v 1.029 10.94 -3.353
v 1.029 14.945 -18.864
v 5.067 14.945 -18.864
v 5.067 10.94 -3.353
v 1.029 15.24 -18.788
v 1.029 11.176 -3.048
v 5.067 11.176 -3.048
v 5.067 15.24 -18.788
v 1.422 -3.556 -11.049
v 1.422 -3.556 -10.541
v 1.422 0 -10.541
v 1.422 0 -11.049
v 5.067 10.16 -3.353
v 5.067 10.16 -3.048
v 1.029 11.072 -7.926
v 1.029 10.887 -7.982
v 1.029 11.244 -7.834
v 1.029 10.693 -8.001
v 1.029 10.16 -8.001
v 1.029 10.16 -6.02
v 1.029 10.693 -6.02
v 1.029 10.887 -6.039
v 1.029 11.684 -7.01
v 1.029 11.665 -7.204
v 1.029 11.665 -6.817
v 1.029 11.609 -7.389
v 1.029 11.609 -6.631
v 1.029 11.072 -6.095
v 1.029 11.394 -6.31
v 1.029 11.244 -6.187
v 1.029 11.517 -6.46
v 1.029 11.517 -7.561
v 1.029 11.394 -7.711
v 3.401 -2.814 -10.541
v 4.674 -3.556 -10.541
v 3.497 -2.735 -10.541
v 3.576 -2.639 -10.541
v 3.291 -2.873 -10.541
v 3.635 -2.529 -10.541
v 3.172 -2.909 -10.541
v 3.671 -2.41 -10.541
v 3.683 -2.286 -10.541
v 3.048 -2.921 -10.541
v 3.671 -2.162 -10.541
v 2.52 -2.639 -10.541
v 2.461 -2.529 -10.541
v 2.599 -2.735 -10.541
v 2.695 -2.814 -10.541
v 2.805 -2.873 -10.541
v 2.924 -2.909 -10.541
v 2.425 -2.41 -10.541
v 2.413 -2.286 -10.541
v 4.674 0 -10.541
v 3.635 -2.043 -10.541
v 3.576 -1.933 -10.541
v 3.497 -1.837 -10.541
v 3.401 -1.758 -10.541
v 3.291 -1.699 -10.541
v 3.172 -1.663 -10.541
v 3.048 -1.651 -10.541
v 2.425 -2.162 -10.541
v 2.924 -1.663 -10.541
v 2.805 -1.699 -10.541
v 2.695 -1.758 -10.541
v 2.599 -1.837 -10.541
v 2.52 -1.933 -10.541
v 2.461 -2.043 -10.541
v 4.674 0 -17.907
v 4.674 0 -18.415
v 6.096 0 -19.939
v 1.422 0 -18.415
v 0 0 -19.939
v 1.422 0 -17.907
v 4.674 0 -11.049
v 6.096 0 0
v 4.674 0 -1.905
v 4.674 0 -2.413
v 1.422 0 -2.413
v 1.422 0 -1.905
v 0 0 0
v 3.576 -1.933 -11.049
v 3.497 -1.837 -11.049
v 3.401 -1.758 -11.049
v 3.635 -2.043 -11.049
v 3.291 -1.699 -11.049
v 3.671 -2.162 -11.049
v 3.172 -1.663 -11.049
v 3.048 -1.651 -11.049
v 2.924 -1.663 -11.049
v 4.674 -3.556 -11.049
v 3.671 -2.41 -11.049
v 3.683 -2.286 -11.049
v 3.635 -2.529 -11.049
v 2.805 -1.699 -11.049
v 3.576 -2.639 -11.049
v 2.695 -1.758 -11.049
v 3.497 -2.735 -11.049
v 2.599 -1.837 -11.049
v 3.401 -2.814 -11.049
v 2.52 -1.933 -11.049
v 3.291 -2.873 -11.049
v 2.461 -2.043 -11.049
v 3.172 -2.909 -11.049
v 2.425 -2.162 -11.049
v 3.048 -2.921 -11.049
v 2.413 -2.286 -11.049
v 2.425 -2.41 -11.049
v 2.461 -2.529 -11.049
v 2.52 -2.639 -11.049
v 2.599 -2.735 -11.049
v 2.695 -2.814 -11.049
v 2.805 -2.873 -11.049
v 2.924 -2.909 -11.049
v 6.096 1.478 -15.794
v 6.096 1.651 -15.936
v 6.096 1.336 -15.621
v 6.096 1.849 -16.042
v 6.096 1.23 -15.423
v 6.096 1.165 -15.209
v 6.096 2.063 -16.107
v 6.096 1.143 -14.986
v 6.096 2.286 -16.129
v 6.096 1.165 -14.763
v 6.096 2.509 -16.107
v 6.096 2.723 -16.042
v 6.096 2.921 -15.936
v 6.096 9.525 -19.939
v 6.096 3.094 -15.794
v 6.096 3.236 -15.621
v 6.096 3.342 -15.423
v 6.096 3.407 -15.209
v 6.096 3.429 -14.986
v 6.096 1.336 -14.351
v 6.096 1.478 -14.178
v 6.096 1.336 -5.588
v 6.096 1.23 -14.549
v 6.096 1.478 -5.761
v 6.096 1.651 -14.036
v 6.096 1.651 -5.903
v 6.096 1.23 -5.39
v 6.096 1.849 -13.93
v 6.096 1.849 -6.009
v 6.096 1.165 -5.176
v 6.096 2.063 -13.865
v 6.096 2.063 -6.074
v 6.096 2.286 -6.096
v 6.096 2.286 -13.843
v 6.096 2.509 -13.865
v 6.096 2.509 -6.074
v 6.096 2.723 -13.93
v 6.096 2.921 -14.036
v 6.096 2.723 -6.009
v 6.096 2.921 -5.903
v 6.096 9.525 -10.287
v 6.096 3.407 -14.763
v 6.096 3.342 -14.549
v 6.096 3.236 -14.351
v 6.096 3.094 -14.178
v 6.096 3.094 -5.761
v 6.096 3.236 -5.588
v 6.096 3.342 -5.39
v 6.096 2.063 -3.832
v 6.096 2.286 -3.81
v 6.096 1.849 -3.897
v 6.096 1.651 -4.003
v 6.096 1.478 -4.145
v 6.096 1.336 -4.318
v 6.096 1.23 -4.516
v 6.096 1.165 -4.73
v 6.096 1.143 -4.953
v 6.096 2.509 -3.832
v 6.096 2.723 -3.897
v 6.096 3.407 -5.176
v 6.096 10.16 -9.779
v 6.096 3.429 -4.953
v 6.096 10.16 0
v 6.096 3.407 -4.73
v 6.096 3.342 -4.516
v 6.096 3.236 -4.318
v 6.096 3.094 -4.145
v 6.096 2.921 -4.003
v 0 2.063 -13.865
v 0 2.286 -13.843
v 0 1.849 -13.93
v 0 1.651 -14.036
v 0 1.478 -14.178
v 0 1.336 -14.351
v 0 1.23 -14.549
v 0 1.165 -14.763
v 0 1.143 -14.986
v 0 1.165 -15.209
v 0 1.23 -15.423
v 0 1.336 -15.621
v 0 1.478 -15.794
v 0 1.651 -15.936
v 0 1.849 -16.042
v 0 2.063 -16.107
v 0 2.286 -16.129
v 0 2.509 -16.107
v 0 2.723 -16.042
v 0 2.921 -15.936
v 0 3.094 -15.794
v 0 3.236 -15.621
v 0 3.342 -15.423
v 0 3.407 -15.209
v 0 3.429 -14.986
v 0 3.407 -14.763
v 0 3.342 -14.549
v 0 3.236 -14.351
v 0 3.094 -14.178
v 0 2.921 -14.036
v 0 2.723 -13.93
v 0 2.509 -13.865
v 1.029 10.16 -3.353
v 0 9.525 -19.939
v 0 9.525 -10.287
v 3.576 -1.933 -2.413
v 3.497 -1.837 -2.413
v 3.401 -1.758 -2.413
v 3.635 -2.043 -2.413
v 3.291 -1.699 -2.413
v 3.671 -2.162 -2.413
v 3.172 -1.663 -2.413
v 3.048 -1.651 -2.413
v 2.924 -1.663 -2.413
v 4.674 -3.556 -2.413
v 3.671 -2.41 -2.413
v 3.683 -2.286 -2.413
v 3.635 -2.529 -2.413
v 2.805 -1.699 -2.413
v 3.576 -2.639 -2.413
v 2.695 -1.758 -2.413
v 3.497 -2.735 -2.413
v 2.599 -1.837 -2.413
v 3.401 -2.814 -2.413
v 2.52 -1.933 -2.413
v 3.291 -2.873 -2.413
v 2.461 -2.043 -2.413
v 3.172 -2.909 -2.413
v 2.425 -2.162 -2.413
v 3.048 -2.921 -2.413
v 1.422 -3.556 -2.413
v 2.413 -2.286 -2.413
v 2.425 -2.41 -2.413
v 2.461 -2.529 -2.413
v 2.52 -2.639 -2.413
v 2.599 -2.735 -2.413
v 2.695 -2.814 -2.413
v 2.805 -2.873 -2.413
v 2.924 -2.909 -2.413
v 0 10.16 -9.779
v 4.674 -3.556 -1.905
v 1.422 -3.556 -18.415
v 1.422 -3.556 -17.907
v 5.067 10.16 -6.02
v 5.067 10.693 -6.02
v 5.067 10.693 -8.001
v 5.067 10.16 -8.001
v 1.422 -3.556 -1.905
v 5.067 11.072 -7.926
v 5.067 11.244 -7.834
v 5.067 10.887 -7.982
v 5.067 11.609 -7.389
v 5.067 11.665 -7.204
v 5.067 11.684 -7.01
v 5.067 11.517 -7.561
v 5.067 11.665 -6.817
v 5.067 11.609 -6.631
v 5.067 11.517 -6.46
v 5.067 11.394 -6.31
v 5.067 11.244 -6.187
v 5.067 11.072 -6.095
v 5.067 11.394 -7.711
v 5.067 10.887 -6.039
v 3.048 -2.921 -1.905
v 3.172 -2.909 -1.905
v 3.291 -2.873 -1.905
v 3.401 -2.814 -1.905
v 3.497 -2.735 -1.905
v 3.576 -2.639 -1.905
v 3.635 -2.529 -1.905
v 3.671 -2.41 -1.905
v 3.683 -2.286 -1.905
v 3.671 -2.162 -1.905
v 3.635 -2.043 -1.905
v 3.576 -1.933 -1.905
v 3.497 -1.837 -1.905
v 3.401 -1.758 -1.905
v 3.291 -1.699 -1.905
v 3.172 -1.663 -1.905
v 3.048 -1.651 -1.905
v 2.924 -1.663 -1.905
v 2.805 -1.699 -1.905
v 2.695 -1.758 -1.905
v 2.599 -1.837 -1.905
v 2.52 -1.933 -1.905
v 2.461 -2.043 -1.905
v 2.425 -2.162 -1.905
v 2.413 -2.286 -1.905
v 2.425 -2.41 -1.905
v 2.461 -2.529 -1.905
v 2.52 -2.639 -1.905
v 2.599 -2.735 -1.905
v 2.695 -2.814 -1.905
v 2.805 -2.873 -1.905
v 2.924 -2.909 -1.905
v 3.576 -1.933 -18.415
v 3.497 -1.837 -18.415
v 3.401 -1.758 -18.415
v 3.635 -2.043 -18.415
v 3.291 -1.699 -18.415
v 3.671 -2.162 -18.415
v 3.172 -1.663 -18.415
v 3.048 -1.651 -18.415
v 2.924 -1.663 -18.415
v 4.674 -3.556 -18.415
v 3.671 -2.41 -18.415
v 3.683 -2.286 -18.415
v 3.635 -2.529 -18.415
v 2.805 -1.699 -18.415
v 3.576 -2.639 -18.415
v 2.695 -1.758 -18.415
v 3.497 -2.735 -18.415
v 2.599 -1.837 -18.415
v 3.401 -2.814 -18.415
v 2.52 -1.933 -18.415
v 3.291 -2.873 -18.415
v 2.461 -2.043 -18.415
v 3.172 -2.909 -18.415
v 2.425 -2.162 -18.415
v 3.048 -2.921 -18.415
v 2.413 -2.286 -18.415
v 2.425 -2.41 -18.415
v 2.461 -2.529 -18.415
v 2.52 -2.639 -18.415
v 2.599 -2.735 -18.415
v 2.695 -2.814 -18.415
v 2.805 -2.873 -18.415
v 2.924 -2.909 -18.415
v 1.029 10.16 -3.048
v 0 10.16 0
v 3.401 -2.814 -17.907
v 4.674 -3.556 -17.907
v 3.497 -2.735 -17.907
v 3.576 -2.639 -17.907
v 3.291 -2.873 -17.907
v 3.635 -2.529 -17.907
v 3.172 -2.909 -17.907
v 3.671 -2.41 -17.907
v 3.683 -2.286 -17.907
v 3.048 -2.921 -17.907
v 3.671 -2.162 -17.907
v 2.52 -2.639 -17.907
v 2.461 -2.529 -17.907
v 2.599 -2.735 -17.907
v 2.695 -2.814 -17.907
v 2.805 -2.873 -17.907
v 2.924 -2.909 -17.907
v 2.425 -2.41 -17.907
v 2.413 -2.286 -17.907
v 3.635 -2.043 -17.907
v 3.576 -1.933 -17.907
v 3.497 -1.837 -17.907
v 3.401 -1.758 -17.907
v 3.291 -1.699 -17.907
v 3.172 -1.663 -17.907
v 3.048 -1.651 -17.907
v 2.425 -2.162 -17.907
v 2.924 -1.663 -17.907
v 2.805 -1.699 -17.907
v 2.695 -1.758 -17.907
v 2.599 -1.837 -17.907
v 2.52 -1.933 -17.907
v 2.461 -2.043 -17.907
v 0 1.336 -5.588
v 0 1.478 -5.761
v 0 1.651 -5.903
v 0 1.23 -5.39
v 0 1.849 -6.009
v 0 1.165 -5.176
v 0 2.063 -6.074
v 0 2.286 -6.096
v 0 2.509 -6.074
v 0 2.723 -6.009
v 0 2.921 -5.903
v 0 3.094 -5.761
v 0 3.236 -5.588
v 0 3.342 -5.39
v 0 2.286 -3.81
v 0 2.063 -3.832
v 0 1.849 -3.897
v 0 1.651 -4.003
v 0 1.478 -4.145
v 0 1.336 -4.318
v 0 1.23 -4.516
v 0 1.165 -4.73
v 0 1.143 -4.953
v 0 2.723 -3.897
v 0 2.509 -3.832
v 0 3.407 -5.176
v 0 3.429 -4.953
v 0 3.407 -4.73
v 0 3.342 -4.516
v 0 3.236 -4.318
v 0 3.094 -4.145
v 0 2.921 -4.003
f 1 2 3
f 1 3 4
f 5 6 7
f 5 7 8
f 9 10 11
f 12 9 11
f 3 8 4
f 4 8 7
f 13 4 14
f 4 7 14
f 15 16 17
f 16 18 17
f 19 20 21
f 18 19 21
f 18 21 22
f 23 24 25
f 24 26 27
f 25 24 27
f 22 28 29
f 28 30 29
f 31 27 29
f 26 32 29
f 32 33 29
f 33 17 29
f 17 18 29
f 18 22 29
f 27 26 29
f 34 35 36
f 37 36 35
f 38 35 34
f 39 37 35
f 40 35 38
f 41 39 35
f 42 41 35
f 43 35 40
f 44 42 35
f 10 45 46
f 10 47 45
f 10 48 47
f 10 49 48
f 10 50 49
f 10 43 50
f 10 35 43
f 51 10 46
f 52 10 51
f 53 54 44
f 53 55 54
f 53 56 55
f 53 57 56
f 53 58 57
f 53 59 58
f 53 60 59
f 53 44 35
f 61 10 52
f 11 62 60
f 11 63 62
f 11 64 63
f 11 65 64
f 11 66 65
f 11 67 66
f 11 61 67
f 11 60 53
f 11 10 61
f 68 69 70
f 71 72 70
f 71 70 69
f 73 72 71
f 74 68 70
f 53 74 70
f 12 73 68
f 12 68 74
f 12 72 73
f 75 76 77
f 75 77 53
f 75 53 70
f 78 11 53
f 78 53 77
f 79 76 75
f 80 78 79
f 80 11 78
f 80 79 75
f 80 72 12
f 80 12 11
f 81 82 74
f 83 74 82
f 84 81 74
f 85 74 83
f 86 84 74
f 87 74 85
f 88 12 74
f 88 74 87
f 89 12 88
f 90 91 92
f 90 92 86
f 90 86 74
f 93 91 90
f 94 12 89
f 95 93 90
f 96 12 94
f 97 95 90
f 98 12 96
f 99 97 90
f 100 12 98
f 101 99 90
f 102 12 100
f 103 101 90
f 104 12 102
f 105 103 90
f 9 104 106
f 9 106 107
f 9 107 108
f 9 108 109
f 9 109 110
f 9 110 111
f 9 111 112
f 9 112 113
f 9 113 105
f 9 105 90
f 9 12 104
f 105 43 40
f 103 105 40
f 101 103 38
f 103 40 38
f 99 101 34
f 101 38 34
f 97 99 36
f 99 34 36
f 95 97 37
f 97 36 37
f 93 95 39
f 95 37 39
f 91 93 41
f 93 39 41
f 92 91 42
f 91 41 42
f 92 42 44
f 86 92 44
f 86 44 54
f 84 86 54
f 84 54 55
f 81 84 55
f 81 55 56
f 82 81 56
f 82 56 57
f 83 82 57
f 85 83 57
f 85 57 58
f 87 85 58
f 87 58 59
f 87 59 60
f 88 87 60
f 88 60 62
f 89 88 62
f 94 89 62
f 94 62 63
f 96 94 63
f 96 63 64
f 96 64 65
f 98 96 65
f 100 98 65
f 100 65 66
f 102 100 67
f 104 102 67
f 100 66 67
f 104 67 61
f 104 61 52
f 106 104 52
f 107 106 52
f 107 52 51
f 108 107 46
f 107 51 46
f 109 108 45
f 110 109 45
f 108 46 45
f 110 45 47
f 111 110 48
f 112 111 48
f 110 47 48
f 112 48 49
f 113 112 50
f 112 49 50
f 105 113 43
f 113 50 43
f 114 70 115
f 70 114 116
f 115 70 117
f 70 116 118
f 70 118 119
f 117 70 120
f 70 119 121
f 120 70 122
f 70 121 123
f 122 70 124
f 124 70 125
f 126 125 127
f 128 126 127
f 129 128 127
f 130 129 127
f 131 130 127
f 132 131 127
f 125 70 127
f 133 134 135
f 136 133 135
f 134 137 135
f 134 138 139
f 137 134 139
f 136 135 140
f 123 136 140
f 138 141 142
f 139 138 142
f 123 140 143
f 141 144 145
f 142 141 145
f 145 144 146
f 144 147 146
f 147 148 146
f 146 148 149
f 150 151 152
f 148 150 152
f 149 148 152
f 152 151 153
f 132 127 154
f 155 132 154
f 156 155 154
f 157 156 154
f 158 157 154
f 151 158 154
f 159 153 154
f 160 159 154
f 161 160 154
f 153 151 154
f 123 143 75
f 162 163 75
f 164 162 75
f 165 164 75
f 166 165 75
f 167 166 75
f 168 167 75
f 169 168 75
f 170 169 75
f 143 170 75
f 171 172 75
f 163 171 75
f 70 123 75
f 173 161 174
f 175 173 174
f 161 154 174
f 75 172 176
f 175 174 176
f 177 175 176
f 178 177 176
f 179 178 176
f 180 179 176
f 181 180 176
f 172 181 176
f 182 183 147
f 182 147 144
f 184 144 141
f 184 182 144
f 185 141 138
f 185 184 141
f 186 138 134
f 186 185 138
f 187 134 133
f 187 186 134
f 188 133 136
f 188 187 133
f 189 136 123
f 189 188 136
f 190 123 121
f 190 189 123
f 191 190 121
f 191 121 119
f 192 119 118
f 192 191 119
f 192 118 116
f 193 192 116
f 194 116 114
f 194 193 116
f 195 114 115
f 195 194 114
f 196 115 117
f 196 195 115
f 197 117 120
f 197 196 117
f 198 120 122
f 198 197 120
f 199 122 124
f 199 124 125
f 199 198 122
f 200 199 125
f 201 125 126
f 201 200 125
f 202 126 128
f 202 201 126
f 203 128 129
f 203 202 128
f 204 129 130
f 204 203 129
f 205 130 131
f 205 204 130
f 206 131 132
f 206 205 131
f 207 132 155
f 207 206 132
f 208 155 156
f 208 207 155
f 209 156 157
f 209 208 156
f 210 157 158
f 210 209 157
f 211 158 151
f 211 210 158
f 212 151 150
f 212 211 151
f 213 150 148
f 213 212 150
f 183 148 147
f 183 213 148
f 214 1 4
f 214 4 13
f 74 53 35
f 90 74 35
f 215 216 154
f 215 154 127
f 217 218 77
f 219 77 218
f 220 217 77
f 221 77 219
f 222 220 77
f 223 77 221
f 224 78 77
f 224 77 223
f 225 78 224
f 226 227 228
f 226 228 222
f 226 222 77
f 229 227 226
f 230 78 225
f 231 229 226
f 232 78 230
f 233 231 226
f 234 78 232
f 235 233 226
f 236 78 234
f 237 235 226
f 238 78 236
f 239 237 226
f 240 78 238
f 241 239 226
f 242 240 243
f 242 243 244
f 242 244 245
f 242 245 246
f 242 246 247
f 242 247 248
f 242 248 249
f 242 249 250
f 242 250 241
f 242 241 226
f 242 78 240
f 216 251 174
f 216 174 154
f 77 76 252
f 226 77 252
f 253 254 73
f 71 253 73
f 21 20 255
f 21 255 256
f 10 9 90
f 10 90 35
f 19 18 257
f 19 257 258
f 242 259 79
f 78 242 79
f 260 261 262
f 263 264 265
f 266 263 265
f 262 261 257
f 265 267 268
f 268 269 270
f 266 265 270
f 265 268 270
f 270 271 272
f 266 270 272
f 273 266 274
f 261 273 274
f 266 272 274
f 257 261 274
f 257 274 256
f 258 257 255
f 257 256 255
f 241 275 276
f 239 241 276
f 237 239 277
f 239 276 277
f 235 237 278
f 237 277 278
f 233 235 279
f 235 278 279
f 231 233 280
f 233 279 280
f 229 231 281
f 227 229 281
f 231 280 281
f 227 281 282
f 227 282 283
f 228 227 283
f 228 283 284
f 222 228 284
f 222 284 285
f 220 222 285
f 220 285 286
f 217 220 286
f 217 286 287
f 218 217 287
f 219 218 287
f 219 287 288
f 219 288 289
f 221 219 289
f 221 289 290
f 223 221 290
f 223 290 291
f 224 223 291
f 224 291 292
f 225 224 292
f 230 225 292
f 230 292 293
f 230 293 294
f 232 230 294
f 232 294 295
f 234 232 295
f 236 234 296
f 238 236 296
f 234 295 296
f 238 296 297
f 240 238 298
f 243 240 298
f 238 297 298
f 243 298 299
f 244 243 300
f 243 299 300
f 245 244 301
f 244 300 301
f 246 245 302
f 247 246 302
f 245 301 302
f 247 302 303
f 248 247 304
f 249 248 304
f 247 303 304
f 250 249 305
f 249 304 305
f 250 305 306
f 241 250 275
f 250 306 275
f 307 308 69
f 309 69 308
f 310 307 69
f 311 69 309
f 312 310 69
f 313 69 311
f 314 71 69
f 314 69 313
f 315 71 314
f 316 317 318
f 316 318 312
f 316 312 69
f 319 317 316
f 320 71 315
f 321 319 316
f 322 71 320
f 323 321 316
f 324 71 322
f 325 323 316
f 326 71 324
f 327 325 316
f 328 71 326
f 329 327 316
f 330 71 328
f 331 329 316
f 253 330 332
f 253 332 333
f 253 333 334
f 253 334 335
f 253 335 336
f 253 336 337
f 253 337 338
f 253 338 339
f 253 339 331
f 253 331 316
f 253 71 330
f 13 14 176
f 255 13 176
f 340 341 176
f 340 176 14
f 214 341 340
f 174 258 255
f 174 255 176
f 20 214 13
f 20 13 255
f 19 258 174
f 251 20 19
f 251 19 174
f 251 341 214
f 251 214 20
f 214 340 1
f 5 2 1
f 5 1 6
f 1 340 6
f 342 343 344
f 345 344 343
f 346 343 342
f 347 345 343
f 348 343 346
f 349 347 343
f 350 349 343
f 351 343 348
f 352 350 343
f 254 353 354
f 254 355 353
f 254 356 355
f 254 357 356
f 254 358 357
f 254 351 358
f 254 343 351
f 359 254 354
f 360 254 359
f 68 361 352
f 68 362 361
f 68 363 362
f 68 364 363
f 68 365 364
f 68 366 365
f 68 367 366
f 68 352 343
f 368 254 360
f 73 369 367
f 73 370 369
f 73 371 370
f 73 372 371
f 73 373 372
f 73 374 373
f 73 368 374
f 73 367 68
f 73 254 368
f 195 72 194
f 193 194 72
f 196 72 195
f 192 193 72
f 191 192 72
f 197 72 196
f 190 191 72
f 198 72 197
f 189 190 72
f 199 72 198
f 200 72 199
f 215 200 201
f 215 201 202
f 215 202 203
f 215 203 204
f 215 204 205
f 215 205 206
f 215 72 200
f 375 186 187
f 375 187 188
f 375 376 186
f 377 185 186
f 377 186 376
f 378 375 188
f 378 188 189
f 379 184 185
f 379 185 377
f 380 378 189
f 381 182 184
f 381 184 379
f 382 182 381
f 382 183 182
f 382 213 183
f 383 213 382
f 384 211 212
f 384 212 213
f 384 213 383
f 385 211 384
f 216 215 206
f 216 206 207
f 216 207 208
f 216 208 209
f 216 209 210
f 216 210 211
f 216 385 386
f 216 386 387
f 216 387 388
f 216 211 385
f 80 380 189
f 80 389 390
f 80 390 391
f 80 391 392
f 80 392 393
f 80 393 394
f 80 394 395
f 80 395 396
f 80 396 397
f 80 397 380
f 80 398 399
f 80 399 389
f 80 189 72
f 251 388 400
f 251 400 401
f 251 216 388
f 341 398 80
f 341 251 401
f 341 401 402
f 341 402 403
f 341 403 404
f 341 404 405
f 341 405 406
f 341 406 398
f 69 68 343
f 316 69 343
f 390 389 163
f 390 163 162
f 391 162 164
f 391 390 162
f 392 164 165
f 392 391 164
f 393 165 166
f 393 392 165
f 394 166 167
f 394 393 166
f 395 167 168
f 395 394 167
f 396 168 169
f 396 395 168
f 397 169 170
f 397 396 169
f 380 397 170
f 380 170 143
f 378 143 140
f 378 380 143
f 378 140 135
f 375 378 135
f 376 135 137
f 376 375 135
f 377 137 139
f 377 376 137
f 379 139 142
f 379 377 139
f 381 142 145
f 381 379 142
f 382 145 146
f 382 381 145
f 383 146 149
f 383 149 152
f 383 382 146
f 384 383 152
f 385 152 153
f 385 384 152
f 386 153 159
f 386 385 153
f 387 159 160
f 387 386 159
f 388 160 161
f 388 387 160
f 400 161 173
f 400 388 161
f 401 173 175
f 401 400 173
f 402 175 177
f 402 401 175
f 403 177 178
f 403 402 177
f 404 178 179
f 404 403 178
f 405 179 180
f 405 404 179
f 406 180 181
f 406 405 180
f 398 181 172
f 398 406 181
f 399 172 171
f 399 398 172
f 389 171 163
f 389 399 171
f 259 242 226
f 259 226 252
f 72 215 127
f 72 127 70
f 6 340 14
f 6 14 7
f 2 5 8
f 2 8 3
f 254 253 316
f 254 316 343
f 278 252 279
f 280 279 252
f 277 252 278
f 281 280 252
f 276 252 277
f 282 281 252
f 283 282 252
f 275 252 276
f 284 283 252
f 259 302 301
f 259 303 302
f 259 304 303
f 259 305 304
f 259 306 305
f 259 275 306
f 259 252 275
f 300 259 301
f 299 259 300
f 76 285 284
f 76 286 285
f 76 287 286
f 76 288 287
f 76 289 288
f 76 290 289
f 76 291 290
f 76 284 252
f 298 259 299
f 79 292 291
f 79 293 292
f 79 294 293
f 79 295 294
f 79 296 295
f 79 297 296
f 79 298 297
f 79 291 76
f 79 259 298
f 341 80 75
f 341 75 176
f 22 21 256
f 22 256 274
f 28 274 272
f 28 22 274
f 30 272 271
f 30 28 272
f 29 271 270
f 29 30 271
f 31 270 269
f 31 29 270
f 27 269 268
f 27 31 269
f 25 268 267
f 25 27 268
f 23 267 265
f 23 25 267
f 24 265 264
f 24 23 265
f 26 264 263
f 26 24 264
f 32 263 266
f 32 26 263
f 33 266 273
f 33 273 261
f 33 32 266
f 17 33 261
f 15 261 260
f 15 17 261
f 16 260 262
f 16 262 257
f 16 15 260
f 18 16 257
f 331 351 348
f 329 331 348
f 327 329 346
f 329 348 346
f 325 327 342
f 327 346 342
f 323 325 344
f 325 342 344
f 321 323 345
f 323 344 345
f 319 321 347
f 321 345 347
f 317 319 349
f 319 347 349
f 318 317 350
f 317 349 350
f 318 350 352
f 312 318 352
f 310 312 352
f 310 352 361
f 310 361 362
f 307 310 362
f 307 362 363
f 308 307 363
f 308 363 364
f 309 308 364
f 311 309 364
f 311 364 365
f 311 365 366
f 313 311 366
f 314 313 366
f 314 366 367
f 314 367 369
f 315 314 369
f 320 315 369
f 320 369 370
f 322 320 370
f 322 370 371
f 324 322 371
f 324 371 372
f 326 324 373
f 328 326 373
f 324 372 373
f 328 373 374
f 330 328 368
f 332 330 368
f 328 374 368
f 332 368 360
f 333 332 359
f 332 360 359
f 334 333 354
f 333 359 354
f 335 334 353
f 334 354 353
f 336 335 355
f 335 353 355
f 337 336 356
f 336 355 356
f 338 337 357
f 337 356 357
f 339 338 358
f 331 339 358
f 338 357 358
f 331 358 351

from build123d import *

# Parameters (mm, degrees)
SKETCH1_R         = 1.143
MAINBODY_DEPTH    = 6.096
SKETCH2_OUTSIDE_W = 13.71
SKETCH2_OUTSIDE_H = 26.41
SKETCH2_OUTSIDE_R = 0.635
SIDETRIM_DEPTH    = 19.939


with BuildPart() as part:
    # Sketch1 → MainBody (new body)
    with BuildSketch(Plane(origin=(0, 0, 0), x_dir=(0, 0, -1), z_dir=(1, 0, 0))):
        with BuildLine():
            Line((0, 0), (0, 10.16))
            Line((0, 10.16), (3.048, 10.16))
            Line((3.048, 10.16), (3.048, 11.176))
            Line((3.048, 11.176), (18.787804319, 15.24))
            Line((18.787804319, 15.24), (18.864004319, 14.944878669))
            Line((18.864004319, 14.944878669), (3.3528, 10.939902935))
            Line((3.3528, 10.939902935), (3.3528, 10.16))
            Line((3.3528, 10.16), (6.0198, 10.16))
            Line((6.0198, 10.16), (6.0198, 10.6934))
            ThreePointArc((6.0198, 10.6934), (7.0104, 11.684), (8.001, 10.6934))
            Line((8.001, 10.6934), (8.001, 10.16))
            Line((8.001, 10.16), (9.779, 10.16))
            Line((9.779, 10.16), (10.287, 9.525))
            Line((10.287, 9.525), (19.939, 9.525))
            Line((19.939, 9.525), (19.939, 0))
            Line((19.939, 0), (18.415, 0))
            Line((18.415, 0), (18.415, -3.556))
            Line((18.415, -3.556), (17.907, -3.556))
            Line((17.907, -3.556), (17.907, 0))
            Line((17.907, 0), (11.049, 0))
            Line((11.049, 0), (11.049, -3.556))
            Line((11.049, -3.556), (10.541, -3.556))
            Line((10.541, -3.556), (10.541, 0))
            Line((10.541, 0), (2.413, 0))
            Line((2.413, 0), (2.413, -3.556))
            Line((2.413, -3.556), (1.905, -3.556))
            Line((1.905, -3.556), (1.905, 0))
            Line((1.905, 0), (0, 0))
        make_face()
        with Locations(Location((4.953, 2.286, 0), (0, 0, 180))):
            Circle(SKETCH1_R, mode=Mode.SUBTRACT)
        with Locations(Location((14.986, 2.286, 0), (0, 0, 180))):
            Circle(SKETCH1_R, mode=Mode.SUBTRACT)
    extrude(amount=MAINBODY_DEPTH)

    # Sketch2 outside → SideTrim (cut)
    # profile 1 of 2: a face of its own
    with BuildSketch(Plane.XY):
        with Locations((3.048, 5.842)):
            Rectangle(SKETCH2_OUTSIDE_W, SKETCH2_OUTSIDE_H)
        Polygon((0, 10.16), (1.0287, 10.16), (1.0287, 15.24), (5.0673, 15.24), (5.0673, 10.16), (6.096, 10.16), (6.096, 0), (4.6736, 0), (4.6736, -3.556), (1.4224, -3.556), (1.4224, 0), (0, 0), align=None, mode=Mode.SUBTRACT)
    # profile 2 of 2: a face of its own
    with BuildSketch(Plane.XY):
        with Locations(Location((3.048, -2.286, 0), (0, 0, 270))):
            Circle(SKETCH2_OUTSIDE_R)
    extrude(amount=-SIDETRIM_DEPTH, mode=Mode.SUBTRACT)


solid = part.part
